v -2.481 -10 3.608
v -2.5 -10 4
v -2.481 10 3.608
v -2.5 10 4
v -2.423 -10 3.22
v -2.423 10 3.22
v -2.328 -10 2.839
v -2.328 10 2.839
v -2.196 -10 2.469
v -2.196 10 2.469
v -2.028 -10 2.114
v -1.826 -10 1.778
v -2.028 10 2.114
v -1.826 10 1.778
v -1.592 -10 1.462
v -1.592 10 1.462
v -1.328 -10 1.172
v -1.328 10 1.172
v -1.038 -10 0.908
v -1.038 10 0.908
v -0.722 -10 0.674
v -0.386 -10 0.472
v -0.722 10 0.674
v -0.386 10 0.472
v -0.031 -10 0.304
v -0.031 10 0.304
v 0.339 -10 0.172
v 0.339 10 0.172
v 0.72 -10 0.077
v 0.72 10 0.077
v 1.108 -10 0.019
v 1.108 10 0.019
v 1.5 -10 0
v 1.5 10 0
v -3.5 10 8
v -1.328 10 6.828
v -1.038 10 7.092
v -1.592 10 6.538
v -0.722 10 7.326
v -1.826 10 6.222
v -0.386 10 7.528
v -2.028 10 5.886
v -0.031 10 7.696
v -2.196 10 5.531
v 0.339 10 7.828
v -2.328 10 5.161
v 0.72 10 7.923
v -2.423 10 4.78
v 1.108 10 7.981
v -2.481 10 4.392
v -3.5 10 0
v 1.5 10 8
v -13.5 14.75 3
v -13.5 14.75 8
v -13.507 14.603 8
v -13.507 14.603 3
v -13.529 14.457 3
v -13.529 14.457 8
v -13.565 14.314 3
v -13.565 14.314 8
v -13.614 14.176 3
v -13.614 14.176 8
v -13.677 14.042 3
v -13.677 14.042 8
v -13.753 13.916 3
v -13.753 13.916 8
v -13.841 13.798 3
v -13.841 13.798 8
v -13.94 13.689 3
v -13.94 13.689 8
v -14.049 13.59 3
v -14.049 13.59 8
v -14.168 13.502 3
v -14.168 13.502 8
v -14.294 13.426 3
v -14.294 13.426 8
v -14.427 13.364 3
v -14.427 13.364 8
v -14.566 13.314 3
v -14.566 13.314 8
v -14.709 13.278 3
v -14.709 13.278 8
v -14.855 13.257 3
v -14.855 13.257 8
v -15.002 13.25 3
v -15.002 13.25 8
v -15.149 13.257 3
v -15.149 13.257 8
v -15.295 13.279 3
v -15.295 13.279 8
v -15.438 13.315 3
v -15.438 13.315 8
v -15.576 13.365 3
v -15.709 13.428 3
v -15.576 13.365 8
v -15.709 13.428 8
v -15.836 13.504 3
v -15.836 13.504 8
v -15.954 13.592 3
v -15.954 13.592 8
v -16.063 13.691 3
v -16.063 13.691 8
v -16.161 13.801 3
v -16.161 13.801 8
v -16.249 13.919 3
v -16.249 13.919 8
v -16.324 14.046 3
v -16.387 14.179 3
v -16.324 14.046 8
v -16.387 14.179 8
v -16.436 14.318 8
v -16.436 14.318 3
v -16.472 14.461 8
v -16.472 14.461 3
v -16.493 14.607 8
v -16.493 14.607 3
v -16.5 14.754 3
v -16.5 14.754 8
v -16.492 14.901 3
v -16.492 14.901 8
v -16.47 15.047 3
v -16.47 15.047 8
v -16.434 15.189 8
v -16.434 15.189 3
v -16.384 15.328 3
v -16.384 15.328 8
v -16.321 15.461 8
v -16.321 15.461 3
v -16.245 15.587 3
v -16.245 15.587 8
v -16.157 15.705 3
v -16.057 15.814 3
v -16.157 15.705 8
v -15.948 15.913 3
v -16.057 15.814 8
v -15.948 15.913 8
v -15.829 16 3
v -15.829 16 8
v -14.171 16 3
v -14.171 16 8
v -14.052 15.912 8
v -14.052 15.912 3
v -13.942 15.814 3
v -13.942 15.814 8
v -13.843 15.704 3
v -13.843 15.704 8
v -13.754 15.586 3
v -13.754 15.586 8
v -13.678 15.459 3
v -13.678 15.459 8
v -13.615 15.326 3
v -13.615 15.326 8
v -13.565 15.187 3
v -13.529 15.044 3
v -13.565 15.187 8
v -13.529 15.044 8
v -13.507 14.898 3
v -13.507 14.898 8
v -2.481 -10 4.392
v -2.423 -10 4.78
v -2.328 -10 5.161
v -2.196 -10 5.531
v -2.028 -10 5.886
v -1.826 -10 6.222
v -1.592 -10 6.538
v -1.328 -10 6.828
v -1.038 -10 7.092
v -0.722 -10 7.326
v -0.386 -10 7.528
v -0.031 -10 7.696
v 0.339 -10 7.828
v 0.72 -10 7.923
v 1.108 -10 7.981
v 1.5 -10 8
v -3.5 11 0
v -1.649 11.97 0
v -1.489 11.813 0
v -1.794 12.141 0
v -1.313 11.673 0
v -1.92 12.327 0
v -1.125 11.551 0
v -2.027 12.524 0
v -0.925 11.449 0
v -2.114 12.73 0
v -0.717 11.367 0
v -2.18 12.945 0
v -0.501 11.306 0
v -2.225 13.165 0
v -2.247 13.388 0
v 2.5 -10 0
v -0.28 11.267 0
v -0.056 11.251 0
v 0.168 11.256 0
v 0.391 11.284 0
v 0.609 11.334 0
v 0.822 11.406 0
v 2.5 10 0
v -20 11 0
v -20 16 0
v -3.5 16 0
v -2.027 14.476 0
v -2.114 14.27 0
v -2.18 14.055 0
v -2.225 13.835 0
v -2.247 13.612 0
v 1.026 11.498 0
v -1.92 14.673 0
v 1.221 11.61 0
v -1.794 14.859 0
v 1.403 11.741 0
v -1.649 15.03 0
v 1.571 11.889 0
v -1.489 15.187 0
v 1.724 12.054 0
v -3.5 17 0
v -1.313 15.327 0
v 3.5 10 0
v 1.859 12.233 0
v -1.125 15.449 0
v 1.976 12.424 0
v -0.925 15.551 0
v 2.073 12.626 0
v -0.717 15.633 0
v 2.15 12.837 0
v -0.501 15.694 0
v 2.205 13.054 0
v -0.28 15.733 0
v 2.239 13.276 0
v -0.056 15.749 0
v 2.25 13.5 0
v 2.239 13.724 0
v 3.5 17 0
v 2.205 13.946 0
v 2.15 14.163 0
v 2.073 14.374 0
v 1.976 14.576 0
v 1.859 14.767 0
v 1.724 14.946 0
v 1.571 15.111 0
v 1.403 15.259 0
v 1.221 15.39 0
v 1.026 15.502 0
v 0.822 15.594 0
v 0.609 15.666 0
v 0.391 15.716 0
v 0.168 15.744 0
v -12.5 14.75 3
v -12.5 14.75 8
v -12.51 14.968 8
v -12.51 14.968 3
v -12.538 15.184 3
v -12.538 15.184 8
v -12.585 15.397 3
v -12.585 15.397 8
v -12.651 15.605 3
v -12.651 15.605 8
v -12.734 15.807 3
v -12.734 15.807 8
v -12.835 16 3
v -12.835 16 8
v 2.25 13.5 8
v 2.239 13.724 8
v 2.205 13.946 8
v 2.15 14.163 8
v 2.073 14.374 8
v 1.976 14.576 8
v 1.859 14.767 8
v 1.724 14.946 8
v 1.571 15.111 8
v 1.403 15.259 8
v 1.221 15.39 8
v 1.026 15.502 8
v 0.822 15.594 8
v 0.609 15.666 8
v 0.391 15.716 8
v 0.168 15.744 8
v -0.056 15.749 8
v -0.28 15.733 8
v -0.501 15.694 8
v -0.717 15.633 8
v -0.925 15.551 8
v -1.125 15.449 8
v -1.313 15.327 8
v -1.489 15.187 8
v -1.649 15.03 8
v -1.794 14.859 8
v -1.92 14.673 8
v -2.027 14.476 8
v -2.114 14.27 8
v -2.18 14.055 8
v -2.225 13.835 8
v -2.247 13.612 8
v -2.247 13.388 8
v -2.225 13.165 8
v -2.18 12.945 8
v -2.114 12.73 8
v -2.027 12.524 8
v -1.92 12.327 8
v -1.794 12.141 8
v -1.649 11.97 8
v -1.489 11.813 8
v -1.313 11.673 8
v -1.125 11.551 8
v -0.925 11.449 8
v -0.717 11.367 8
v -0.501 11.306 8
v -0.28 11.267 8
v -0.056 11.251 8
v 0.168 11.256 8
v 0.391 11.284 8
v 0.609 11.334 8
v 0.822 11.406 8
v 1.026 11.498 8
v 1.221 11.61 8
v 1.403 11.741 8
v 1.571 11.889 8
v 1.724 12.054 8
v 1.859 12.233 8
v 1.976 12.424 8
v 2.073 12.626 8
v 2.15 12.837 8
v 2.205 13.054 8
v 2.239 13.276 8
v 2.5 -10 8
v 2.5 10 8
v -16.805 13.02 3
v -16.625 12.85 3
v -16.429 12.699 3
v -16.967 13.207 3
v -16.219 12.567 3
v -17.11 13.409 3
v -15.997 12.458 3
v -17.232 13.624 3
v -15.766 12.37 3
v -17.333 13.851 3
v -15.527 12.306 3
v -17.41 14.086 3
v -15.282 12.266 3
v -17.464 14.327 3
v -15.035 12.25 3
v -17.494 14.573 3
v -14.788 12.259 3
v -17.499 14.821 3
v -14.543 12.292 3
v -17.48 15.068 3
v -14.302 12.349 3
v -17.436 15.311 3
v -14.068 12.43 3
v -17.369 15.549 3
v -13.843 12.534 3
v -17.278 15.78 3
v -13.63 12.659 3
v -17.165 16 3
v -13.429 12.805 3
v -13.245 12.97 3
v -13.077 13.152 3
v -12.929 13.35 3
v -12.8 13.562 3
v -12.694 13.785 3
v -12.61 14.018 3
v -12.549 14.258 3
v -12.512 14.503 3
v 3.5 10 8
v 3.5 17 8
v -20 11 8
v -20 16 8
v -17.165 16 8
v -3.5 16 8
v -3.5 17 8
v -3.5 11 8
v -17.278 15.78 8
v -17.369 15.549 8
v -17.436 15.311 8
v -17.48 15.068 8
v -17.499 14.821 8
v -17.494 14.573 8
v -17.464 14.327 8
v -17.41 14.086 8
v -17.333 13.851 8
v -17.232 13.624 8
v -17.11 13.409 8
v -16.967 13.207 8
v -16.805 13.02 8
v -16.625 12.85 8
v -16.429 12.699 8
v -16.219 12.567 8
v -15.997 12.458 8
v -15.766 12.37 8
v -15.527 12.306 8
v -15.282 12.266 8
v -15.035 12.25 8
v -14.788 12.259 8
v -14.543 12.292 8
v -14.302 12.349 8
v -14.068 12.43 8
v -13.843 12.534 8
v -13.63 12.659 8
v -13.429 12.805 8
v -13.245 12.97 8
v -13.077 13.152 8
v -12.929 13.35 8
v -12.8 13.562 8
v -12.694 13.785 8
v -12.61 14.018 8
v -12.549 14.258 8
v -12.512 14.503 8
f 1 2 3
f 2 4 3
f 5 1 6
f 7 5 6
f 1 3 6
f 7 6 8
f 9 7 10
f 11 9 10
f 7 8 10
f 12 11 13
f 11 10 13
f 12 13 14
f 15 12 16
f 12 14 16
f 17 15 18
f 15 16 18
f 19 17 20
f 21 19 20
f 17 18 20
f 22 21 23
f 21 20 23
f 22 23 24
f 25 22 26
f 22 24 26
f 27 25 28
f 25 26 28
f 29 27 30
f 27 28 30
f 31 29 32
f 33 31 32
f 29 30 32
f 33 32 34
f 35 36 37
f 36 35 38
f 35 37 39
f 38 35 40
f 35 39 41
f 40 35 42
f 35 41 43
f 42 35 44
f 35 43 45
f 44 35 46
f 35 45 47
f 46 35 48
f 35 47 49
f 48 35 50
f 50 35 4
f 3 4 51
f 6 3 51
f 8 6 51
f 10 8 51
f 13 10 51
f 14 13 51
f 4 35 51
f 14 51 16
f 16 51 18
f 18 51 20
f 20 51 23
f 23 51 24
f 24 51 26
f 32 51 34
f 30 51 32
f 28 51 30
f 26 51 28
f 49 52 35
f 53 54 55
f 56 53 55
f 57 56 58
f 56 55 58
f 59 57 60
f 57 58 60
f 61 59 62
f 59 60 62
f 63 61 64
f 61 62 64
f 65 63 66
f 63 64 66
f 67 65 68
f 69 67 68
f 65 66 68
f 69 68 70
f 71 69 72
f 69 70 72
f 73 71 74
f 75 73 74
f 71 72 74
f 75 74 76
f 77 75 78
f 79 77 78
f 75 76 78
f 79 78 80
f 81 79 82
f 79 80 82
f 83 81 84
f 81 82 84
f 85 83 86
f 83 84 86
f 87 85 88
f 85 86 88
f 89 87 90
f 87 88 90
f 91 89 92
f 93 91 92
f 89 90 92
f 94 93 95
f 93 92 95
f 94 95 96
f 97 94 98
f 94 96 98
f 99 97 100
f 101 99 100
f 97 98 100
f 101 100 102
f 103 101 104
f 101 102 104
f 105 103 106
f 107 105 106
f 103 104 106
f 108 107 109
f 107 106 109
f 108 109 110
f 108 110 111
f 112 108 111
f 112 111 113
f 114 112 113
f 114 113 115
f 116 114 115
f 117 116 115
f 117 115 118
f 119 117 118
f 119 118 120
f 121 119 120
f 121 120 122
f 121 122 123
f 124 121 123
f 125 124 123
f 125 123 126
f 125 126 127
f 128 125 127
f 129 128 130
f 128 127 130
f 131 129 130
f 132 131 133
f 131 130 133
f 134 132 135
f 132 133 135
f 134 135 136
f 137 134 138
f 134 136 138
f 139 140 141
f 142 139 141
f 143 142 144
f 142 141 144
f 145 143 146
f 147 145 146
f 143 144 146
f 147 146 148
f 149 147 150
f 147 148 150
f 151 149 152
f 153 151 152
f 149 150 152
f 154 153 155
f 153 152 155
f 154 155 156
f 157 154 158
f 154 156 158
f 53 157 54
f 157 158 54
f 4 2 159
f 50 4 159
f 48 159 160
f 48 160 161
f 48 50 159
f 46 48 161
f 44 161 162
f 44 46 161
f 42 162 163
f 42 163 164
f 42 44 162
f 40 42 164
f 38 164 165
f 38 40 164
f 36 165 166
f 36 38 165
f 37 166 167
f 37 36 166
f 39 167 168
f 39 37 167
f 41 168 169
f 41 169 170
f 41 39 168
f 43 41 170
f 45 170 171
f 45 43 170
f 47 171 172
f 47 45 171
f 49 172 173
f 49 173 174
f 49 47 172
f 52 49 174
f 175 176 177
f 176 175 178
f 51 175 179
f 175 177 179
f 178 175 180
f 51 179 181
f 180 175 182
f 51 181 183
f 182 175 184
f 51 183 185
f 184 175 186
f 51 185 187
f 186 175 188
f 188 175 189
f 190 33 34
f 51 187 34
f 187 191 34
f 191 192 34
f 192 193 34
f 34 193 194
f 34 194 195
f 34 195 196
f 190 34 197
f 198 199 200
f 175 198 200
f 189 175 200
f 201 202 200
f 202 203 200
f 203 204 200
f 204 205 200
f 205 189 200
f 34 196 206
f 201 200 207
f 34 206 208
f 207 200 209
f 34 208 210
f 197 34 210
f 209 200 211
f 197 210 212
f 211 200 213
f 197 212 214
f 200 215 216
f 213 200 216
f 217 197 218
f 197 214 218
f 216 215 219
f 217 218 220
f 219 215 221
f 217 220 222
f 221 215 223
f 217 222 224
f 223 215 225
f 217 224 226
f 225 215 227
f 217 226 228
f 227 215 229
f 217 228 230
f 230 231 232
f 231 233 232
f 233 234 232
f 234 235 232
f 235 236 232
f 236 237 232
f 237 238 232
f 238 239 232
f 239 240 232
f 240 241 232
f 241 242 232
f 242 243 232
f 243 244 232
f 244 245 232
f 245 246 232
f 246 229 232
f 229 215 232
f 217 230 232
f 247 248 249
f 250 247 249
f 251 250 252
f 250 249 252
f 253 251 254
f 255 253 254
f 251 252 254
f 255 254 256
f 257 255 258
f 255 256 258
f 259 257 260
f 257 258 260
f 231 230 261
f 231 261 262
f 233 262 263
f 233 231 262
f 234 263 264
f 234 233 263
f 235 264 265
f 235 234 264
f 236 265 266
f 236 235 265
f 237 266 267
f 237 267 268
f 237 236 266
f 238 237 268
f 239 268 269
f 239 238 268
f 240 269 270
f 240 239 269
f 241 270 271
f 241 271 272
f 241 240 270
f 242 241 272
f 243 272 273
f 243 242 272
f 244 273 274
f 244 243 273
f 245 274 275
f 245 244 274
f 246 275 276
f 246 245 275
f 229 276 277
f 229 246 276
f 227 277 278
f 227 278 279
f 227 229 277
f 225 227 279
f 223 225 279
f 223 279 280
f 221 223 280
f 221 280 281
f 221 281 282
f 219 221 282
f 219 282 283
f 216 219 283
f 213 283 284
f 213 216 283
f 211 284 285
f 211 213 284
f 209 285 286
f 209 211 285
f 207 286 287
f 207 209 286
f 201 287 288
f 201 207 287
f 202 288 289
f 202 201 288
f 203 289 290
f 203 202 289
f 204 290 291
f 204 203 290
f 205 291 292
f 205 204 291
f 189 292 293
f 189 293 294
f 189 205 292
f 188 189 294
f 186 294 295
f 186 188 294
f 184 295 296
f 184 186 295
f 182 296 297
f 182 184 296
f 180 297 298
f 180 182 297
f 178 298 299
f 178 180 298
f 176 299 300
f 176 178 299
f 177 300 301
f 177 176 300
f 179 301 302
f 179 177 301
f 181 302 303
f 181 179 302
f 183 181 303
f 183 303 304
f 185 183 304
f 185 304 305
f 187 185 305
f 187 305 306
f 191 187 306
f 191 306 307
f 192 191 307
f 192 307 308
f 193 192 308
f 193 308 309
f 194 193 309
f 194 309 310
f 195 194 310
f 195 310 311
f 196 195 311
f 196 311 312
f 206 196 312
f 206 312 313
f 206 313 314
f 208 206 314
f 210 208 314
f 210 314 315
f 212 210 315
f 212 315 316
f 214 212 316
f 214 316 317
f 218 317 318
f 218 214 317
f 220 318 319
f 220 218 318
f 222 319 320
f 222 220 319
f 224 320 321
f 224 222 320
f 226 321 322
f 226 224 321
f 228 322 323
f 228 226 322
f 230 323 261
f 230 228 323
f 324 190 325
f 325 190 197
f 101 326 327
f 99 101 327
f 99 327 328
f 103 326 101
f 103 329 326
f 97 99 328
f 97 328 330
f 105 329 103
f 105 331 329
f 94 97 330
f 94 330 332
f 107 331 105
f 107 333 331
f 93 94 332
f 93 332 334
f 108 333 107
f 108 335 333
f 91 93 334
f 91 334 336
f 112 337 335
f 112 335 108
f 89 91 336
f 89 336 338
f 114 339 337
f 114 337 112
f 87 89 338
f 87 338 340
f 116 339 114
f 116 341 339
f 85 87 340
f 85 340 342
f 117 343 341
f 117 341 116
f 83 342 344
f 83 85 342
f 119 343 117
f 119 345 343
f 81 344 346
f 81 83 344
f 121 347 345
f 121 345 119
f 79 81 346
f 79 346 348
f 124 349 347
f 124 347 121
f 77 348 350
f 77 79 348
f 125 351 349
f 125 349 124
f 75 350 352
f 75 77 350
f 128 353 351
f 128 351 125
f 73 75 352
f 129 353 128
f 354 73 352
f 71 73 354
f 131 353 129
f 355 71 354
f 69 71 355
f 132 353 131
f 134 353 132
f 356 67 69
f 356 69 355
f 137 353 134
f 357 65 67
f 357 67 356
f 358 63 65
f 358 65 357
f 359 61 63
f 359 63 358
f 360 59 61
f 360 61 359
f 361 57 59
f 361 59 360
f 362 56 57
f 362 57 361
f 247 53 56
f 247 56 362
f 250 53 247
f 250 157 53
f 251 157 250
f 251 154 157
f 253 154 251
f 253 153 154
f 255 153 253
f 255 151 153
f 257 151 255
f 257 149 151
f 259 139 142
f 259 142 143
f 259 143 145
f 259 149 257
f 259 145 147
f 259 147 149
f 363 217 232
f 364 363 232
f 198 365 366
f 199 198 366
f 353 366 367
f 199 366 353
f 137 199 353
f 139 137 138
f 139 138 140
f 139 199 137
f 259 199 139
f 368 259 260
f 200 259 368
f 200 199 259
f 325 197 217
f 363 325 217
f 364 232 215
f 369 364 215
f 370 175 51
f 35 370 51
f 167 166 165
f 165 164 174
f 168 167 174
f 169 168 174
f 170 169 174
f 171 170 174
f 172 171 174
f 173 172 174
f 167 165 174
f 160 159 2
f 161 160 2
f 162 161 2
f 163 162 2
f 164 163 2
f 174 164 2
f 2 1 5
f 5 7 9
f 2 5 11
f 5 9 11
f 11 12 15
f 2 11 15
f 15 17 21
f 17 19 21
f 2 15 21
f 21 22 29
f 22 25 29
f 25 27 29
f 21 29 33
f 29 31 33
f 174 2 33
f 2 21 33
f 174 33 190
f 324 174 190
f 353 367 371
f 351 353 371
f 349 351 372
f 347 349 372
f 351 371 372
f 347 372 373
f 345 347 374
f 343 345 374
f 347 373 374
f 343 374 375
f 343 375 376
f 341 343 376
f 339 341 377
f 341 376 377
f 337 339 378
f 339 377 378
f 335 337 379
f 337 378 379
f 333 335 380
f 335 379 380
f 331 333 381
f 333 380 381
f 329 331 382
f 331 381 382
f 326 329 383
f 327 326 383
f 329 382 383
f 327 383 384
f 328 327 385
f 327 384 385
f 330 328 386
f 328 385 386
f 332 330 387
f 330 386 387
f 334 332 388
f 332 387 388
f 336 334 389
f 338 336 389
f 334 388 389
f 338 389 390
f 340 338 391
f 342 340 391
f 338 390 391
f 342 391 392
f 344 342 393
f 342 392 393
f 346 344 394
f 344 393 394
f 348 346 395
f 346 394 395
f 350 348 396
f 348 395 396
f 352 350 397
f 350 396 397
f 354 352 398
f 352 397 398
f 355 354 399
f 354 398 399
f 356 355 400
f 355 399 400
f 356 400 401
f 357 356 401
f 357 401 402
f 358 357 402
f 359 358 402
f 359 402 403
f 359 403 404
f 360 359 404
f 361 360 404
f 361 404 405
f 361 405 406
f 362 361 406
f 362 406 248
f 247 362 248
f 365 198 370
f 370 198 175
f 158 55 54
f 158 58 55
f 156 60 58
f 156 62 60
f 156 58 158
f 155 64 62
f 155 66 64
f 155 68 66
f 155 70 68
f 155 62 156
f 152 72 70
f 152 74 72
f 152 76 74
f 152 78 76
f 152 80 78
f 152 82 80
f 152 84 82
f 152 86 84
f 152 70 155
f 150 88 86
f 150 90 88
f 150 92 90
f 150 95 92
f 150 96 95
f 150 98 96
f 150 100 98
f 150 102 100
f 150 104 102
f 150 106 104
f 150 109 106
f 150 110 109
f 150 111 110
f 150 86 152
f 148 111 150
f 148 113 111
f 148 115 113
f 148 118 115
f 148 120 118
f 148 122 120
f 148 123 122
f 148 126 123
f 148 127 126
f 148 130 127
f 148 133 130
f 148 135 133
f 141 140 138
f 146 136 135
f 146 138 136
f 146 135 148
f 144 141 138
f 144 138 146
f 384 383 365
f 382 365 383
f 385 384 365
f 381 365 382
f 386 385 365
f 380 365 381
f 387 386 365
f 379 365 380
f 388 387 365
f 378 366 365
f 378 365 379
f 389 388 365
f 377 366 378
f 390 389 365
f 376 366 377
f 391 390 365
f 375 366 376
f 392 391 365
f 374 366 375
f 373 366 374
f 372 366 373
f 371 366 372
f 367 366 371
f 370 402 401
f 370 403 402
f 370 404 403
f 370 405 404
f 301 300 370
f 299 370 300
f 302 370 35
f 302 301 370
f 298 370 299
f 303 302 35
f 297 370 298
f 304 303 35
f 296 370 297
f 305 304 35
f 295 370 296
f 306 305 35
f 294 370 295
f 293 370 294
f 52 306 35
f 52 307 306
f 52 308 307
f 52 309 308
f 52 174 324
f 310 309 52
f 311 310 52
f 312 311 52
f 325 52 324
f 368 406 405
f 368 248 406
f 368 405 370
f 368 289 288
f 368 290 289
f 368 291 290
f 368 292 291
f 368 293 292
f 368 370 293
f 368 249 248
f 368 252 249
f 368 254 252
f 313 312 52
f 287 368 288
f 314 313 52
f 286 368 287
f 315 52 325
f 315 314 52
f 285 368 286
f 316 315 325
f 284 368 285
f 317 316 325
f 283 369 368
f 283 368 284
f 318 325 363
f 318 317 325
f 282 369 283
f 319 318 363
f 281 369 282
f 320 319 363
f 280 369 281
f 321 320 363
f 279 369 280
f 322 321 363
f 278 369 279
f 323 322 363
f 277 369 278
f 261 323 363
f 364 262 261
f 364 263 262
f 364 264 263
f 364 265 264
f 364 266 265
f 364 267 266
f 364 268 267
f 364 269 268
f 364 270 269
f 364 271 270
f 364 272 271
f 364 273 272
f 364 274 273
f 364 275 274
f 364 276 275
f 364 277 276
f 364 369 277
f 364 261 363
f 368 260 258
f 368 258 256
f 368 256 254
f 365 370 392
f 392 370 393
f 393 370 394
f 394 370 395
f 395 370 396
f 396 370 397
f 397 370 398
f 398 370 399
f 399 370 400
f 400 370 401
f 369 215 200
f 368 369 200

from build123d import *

# Parameters (mm, degrees)
F0_W     = 5
F0_H     = 20
F0_R     = 2.25
F0_W_2   = 16.5
F0_H_2   = 5
F1_DEPTH = 8
F2_R     = 3.99999
F4_DEPTH = 5


# Not quite as in the source:
# - a fillet or chamfer is up to 0.001 mm smaller than in the source, because OpenCascade refuses the exact size
# - a feature names something its author has since deleted; it is built from what else it names


with BuildPart() as f1:
    # F0 (on Top) → F1 (new body)
    with BuildSketch(Plane.XY):
        Rectangle(F0_W, F0_H)
        Polygon((-2.5, 10), (2.5, 10), (3.5, 10), (3.5, 17), (-3.5, 17), (-3.5, 16), (-3.5, 11), (-3.5, 10), align=None)
        with Locations((0, 13.5)):
            Circle(F0_R, mode=Mode.SUBTRACT)
        with Locations((-11.75, 13.5)):
            Rectangle(F0_W_2, F0_H_2)
    extrude(amount=F1_DEPTH)

    # F2 (radius 4 in the source; OpenCascade refuses exactly that, so slightly less here)
    f2_edges = [f1.edges().sort_by_distance(p)[0] for p in [
        (-2.5, 0, 8),
        (-2.5, 0, 0),
    ]]
    fillet(f2_edges, radius=F2_R)

    # F3 (on face) → F4 (cut)
    with BuildSketch(Plane.XY.offset(8)):
        with BuildLine():
            ThreePointArc((-15.8291561976, 16), (-15, 16.25), (-14.1708438024, 16))
            Line((-14.1708438024, 16), (-12.8349364905, 16))
            ThreePointArc((-12.8349364905, 16), (-15, 17.25), (-17.1650635095, 16))
            Line((-17.1650635095, 16), (-15.8291561976, 16))
        make_face()
        with BuildLine():
            ThreePointArc((-14.1708438024, 16), (-13.6783089816, 15.4593185827), (-13.5, 14.75))
            ThreePointArc((-13.5, 14.75), (-15.7093185827, 13.4283089816), (-15.8291561976, 16))
            Line((-15.8291561976, 16), (-17.1650635095, 16))
            ThreePointArc((-17.1650635095, 16), (-15.6470476128, 12.3351854343), (-12.5, 14.75))
            ThreePointArc((-12.5, 14.75), (-12.5851854343, 15.3970476128), (-12.8349364905, 16))
            Line((-12.8349364905, 16), (-14.1708438024, 16))
        make_face()
    extrude(amount=-F4_DEPTH, mode=Mode.SUBTRACT)


solid = f1.part
